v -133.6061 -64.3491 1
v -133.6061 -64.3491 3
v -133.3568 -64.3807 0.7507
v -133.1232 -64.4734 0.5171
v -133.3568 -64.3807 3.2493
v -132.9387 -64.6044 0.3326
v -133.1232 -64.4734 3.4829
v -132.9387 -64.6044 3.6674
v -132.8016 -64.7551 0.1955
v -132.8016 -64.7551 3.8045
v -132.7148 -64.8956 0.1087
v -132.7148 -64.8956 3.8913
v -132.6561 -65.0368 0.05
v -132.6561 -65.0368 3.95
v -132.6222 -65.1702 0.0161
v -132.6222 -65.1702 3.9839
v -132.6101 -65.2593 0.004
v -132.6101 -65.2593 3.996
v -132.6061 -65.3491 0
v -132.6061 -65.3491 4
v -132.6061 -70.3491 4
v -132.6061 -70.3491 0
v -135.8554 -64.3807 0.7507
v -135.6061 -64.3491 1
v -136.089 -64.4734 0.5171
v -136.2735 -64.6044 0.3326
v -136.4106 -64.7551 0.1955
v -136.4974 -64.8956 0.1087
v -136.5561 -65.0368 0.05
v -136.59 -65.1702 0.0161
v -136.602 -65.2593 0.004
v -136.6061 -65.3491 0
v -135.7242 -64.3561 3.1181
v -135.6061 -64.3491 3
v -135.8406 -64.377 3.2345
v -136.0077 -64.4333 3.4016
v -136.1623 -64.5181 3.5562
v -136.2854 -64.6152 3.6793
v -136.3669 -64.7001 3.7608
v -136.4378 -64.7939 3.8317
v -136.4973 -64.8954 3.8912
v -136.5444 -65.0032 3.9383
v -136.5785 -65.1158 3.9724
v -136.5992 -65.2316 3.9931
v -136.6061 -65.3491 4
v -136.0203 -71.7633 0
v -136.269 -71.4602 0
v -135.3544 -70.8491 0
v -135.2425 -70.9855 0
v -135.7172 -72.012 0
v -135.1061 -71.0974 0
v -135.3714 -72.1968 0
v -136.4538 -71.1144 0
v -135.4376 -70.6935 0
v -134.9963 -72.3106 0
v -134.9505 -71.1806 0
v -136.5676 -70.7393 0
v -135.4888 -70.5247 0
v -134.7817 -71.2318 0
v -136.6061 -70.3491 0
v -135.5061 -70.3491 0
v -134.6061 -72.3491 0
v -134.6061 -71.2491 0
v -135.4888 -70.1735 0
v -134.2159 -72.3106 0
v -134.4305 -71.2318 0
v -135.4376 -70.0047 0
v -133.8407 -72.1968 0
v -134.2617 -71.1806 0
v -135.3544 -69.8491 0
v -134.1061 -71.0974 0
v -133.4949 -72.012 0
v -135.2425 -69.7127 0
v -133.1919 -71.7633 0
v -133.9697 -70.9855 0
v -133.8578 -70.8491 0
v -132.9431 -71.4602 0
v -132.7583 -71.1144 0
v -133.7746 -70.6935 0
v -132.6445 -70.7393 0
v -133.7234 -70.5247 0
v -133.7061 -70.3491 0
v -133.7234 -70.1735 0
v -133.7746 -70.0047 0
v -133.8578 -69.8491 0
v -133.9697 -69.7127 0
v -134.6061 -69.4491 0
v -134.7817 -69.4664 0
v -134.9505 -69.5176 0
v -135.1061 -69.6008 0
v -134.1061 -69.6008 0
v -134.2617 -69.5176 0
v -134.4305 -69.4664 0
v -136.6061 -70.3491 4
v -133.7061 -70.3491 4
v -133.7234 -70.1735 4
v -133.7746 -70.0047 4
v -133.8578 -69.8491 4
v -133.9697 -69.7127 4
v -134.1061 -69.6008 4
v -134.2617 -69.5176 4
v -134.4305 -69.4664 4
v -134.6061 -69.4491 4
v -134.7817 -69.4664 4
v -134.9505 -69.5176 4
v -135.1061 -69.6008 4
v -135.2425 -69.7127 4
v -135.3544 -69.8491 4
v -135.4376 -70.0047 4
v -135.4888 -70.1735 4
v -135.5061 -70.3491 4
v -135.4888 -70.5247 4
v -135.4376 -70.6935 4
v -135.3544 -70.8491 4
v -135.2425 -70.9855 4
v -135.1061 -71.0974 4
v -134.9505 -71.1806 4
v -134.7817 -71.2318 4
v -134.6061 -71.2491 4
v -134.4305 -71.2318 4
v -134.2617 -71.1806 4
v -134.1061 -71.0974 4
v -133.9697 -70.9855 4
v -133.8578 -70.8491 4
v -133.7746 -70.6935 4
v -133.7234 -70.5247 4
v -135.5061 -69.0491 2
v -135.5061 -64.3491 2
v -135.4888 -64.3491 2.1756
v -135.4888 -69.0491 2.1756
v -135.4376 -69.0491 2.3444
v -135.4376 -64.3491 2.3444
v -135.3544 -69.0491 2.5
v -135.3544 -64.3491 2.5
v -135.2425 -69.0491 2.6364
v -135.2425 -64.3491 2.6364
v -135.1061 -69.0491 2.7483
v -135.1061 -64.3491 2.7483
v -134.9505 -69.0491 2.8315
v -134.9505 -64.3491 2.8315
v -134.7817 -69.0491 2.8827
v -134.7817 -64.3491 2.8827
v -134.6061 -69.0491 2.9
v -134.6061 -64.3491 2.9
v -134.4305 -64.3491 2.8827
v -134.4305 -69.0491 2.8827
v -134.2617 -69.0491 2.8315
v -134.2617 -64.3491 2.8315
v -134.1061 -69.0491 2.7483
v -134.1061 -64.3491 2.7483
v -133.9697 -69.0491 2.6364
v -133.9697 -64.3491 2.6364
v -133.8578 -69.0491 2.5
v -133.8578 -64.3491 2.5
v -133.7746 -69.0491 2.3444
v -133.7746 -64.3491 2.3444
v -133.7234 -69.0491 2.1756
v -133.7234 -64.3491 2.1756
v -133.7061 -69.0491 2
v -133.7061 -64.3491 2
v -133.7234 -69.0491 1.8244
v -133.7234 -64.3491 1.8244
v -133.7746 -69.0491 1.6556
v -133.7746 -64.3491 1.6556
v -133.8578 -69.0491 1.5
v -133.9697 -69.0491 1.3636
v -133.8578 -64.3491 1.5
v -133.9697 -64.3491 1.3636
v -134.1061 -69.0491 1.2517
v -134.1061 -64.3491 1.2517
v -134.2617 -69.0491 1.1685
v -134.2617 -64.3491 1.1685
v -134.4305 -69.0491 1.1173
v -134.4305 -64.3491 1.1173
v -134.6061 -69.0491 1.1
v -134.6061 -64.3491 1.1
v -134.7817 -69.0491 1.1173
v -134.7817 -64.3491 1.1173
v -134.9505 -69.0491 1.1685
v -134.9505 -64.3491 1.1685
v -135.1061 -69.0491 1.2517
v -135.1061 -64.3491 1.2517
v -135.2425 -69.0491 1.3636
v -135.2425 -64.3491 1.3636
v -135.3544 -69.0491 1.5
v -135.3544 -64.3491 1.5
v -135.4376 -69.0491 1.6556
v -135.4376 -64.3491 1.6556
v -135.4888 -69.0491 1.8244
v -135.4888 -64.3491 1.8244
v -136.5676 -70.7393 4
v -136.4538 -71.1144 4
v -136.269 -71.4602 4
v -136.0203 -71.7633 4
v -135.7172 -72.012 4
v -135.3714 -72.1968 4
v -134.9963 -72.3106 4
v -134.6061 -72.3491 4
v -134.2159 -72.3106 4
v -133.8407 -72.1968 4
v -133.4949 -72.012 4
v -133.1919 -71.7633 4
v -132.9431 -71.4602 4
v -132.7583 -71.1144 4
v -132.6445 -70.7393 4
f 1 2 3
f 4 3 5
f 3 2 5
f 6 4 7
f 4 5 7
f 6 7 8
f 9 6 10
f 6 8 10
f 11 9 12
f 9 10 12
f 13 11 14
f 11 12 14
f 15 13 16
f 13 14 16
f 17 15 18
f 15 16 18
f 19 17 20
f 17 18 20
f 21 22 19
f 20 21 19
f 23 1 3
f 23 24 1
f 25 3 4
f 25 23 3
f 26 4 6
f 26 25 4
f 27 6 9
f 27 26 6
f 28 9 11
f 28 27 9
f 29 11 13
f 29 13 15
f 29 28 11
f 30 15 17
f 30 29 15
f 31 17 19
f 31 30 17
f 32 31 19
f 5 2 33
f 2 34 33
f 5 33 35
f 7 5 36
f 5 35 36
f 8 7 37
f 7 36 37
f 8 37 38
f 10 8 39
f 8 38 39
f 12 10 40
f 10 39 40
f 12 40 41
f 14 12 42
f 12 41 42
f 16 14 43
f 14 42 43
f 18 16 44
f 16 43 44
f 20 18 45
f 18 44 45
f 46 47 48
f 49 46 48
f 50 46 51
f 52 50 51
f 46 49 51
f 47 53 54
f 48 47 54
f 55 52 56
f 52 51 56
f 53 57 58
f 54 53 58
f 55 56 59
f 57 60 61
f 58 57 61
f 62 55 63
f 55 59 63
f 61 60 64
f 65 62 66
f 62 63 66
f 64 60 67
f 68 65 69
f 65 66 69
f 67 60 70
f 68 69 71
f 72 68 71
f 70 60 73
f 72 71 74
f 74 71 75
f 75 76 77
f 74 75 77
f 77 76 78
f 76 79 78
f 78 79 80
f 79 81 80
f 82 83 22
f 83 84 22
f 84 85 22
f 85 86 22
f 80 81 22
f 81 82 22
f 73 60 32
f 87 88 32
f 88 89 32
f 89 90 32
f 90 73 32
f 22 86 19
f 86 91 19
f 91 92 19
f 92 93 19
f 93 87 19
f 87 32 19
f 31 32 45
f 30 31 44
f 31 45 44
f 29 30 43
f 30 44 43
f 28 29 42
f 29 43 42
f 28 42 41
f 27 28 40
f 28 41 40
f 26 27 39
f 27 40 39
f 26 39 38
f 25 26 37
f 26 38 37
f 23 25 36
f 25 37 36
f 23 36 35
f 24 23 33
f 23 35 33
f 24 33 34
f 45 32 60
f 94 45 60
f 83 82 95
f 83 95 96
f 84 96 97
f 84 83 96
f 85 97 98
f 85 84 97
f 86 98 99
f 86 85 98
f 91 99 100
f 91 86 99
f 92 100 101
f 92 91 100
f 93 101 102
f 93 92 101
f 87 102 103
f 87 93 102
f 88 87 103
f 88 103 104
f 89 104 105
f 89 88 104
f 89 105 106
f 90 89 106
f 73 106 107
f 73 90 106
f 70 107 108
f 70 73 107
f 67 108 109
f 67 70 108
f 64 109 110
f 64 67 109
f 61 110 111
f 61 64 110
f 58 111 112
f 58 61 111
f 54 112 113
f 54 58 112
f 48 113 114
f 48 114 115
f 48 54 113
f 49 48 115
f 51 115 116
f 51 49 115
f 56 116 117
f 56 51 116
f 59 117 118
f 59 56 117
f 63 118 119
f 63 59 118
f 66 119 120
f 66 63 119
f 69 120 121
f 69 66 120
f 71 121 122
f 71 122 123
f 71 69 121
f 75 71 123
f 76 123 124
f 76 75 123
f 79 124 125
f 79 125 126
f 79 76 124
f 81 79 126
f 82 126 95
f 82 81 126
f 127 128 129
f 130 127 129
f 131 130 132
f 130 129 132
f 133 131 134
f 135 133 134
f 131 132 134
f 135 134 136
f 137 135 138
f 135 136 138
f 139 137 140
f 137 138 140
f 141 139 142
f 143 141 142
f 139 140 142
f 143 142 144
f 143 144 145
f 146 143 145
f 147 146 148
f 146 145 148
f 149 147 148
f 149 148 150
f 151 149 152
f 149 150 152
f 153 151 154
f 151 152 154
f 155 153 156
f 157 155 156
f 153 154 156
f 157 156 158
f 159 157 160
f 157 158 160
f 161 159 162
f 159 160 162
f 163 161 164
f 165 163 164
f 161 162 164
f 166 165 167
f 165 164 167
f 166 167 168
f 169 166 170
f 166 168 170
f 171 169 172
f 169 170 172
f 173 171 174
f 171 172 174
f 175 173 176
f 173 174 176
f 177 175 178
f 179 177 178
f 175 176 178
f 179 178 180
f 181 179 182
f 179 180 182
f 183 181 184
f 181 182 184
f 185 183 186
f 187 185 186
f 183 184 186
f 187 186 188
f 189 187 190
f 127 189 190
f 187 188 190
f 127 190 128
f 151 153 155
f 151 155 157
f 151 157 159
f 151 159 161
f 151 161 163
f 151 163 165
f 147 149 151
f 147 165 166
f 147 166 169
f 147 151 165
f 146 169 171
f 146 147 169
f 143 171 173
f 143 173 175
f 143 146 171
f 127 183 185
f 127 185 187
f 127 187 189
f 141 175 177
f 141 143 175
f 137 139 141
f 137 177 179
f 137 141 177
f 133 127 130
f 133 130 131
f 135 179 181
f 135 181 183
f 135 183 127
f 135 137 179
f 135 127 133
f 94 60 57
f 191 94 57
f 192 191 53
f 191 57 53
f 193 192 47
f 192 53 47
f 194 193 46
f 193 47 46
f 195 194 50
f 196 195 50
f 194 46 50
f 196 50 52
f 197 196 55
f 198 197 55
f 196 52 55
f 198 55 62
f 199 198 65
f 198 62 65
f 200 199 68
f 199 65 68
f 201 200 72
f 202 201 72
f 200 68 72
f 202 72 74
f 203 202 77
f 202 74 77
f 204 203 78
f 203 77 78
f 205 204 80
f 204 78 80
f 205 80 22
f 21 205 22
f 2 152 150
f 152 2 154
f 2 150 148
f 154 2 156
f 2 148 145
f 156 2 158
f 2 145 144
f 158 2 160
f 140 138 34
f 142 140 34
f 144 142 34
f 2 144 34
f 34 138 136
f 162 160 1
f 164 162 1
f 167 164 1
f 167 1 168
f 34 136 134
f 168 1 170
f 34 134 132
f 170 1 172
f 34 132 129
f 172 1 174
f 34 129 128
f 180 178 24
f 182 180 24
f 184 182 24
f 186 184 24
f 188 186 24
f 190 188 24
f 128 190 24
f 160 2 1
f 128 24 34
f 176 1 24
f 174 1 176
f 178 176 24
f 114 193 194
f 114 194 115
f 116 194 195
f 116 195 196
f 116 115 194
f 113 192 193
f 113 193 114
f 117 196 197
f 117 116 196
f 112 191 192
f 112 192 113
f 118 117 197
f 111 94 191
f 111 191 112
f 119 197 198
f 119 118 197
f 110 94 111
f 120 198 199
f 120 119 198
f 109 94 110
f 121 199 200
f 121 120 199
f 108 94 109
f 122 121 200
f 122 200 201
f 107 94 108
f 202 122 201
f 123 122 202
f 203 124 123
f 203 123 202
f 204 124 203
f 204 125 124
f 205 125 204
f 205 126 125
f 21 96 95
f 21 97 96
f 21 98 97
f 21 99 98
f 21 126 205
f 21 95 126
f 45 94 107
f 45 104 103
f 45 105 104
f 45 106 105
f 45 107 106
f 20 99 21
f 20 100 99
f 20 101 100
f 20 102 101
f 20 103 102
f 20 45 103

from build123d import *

# Parameters (mm, degrees)
F0_R     = 0.9
F1_DEPTH = 4
F2_R     = 0.9
F3_DEPTH = 4.7
F4_R     = 1


with BuildPart() as f1:
    # F0 (on Top) → F1 (new body)
    with BuildSketch(Plane.XY):
        with BuildLine():
            Line((-136.606078, -64.349075), (-136.606078, -70.349075))
            ThreePointArc((-136.606078, -70.349075), (-134.606078, -72.349075), (-132.606078, -70.349075))
            Line((-132.606078, -70.349075), (-132.606078, -64.349075))
            Line((-132.606078, -64.349075), (-136.606078, -64.349075))
        make_face()
        with Locations((-134.606078, -70.349075)):
            Circle(F0_R, mode=Mode.SUBTRACT)
    extrude(amount=F1_DEPTH)

    # F2 (on face) → F3 (cut)
    with BuildSketch(Plane(origin=(0, -64.349075, 0), x_dir=(-1, 0, 0), z_dir=(0, 1, 0))):
        with Locations((134.606078, 2)):
            Circle(F2_R)
    extrude(amount=-F3_DEPTH, mode=Mode.SUBTRACT)

    # F4
    f4_edges = [f1.edges().sort_by_distance(p)[0] for p in [
        (-132.606078, -64.349075, 2),
        (-134.606078, -64.349075, 0),
        (-136.606078, -64.349075, 2),
        (-134.606078, -64.349075, 4),
    ]]
    fillet(f4_edges, radius=F4_R)


solid = f1.part
